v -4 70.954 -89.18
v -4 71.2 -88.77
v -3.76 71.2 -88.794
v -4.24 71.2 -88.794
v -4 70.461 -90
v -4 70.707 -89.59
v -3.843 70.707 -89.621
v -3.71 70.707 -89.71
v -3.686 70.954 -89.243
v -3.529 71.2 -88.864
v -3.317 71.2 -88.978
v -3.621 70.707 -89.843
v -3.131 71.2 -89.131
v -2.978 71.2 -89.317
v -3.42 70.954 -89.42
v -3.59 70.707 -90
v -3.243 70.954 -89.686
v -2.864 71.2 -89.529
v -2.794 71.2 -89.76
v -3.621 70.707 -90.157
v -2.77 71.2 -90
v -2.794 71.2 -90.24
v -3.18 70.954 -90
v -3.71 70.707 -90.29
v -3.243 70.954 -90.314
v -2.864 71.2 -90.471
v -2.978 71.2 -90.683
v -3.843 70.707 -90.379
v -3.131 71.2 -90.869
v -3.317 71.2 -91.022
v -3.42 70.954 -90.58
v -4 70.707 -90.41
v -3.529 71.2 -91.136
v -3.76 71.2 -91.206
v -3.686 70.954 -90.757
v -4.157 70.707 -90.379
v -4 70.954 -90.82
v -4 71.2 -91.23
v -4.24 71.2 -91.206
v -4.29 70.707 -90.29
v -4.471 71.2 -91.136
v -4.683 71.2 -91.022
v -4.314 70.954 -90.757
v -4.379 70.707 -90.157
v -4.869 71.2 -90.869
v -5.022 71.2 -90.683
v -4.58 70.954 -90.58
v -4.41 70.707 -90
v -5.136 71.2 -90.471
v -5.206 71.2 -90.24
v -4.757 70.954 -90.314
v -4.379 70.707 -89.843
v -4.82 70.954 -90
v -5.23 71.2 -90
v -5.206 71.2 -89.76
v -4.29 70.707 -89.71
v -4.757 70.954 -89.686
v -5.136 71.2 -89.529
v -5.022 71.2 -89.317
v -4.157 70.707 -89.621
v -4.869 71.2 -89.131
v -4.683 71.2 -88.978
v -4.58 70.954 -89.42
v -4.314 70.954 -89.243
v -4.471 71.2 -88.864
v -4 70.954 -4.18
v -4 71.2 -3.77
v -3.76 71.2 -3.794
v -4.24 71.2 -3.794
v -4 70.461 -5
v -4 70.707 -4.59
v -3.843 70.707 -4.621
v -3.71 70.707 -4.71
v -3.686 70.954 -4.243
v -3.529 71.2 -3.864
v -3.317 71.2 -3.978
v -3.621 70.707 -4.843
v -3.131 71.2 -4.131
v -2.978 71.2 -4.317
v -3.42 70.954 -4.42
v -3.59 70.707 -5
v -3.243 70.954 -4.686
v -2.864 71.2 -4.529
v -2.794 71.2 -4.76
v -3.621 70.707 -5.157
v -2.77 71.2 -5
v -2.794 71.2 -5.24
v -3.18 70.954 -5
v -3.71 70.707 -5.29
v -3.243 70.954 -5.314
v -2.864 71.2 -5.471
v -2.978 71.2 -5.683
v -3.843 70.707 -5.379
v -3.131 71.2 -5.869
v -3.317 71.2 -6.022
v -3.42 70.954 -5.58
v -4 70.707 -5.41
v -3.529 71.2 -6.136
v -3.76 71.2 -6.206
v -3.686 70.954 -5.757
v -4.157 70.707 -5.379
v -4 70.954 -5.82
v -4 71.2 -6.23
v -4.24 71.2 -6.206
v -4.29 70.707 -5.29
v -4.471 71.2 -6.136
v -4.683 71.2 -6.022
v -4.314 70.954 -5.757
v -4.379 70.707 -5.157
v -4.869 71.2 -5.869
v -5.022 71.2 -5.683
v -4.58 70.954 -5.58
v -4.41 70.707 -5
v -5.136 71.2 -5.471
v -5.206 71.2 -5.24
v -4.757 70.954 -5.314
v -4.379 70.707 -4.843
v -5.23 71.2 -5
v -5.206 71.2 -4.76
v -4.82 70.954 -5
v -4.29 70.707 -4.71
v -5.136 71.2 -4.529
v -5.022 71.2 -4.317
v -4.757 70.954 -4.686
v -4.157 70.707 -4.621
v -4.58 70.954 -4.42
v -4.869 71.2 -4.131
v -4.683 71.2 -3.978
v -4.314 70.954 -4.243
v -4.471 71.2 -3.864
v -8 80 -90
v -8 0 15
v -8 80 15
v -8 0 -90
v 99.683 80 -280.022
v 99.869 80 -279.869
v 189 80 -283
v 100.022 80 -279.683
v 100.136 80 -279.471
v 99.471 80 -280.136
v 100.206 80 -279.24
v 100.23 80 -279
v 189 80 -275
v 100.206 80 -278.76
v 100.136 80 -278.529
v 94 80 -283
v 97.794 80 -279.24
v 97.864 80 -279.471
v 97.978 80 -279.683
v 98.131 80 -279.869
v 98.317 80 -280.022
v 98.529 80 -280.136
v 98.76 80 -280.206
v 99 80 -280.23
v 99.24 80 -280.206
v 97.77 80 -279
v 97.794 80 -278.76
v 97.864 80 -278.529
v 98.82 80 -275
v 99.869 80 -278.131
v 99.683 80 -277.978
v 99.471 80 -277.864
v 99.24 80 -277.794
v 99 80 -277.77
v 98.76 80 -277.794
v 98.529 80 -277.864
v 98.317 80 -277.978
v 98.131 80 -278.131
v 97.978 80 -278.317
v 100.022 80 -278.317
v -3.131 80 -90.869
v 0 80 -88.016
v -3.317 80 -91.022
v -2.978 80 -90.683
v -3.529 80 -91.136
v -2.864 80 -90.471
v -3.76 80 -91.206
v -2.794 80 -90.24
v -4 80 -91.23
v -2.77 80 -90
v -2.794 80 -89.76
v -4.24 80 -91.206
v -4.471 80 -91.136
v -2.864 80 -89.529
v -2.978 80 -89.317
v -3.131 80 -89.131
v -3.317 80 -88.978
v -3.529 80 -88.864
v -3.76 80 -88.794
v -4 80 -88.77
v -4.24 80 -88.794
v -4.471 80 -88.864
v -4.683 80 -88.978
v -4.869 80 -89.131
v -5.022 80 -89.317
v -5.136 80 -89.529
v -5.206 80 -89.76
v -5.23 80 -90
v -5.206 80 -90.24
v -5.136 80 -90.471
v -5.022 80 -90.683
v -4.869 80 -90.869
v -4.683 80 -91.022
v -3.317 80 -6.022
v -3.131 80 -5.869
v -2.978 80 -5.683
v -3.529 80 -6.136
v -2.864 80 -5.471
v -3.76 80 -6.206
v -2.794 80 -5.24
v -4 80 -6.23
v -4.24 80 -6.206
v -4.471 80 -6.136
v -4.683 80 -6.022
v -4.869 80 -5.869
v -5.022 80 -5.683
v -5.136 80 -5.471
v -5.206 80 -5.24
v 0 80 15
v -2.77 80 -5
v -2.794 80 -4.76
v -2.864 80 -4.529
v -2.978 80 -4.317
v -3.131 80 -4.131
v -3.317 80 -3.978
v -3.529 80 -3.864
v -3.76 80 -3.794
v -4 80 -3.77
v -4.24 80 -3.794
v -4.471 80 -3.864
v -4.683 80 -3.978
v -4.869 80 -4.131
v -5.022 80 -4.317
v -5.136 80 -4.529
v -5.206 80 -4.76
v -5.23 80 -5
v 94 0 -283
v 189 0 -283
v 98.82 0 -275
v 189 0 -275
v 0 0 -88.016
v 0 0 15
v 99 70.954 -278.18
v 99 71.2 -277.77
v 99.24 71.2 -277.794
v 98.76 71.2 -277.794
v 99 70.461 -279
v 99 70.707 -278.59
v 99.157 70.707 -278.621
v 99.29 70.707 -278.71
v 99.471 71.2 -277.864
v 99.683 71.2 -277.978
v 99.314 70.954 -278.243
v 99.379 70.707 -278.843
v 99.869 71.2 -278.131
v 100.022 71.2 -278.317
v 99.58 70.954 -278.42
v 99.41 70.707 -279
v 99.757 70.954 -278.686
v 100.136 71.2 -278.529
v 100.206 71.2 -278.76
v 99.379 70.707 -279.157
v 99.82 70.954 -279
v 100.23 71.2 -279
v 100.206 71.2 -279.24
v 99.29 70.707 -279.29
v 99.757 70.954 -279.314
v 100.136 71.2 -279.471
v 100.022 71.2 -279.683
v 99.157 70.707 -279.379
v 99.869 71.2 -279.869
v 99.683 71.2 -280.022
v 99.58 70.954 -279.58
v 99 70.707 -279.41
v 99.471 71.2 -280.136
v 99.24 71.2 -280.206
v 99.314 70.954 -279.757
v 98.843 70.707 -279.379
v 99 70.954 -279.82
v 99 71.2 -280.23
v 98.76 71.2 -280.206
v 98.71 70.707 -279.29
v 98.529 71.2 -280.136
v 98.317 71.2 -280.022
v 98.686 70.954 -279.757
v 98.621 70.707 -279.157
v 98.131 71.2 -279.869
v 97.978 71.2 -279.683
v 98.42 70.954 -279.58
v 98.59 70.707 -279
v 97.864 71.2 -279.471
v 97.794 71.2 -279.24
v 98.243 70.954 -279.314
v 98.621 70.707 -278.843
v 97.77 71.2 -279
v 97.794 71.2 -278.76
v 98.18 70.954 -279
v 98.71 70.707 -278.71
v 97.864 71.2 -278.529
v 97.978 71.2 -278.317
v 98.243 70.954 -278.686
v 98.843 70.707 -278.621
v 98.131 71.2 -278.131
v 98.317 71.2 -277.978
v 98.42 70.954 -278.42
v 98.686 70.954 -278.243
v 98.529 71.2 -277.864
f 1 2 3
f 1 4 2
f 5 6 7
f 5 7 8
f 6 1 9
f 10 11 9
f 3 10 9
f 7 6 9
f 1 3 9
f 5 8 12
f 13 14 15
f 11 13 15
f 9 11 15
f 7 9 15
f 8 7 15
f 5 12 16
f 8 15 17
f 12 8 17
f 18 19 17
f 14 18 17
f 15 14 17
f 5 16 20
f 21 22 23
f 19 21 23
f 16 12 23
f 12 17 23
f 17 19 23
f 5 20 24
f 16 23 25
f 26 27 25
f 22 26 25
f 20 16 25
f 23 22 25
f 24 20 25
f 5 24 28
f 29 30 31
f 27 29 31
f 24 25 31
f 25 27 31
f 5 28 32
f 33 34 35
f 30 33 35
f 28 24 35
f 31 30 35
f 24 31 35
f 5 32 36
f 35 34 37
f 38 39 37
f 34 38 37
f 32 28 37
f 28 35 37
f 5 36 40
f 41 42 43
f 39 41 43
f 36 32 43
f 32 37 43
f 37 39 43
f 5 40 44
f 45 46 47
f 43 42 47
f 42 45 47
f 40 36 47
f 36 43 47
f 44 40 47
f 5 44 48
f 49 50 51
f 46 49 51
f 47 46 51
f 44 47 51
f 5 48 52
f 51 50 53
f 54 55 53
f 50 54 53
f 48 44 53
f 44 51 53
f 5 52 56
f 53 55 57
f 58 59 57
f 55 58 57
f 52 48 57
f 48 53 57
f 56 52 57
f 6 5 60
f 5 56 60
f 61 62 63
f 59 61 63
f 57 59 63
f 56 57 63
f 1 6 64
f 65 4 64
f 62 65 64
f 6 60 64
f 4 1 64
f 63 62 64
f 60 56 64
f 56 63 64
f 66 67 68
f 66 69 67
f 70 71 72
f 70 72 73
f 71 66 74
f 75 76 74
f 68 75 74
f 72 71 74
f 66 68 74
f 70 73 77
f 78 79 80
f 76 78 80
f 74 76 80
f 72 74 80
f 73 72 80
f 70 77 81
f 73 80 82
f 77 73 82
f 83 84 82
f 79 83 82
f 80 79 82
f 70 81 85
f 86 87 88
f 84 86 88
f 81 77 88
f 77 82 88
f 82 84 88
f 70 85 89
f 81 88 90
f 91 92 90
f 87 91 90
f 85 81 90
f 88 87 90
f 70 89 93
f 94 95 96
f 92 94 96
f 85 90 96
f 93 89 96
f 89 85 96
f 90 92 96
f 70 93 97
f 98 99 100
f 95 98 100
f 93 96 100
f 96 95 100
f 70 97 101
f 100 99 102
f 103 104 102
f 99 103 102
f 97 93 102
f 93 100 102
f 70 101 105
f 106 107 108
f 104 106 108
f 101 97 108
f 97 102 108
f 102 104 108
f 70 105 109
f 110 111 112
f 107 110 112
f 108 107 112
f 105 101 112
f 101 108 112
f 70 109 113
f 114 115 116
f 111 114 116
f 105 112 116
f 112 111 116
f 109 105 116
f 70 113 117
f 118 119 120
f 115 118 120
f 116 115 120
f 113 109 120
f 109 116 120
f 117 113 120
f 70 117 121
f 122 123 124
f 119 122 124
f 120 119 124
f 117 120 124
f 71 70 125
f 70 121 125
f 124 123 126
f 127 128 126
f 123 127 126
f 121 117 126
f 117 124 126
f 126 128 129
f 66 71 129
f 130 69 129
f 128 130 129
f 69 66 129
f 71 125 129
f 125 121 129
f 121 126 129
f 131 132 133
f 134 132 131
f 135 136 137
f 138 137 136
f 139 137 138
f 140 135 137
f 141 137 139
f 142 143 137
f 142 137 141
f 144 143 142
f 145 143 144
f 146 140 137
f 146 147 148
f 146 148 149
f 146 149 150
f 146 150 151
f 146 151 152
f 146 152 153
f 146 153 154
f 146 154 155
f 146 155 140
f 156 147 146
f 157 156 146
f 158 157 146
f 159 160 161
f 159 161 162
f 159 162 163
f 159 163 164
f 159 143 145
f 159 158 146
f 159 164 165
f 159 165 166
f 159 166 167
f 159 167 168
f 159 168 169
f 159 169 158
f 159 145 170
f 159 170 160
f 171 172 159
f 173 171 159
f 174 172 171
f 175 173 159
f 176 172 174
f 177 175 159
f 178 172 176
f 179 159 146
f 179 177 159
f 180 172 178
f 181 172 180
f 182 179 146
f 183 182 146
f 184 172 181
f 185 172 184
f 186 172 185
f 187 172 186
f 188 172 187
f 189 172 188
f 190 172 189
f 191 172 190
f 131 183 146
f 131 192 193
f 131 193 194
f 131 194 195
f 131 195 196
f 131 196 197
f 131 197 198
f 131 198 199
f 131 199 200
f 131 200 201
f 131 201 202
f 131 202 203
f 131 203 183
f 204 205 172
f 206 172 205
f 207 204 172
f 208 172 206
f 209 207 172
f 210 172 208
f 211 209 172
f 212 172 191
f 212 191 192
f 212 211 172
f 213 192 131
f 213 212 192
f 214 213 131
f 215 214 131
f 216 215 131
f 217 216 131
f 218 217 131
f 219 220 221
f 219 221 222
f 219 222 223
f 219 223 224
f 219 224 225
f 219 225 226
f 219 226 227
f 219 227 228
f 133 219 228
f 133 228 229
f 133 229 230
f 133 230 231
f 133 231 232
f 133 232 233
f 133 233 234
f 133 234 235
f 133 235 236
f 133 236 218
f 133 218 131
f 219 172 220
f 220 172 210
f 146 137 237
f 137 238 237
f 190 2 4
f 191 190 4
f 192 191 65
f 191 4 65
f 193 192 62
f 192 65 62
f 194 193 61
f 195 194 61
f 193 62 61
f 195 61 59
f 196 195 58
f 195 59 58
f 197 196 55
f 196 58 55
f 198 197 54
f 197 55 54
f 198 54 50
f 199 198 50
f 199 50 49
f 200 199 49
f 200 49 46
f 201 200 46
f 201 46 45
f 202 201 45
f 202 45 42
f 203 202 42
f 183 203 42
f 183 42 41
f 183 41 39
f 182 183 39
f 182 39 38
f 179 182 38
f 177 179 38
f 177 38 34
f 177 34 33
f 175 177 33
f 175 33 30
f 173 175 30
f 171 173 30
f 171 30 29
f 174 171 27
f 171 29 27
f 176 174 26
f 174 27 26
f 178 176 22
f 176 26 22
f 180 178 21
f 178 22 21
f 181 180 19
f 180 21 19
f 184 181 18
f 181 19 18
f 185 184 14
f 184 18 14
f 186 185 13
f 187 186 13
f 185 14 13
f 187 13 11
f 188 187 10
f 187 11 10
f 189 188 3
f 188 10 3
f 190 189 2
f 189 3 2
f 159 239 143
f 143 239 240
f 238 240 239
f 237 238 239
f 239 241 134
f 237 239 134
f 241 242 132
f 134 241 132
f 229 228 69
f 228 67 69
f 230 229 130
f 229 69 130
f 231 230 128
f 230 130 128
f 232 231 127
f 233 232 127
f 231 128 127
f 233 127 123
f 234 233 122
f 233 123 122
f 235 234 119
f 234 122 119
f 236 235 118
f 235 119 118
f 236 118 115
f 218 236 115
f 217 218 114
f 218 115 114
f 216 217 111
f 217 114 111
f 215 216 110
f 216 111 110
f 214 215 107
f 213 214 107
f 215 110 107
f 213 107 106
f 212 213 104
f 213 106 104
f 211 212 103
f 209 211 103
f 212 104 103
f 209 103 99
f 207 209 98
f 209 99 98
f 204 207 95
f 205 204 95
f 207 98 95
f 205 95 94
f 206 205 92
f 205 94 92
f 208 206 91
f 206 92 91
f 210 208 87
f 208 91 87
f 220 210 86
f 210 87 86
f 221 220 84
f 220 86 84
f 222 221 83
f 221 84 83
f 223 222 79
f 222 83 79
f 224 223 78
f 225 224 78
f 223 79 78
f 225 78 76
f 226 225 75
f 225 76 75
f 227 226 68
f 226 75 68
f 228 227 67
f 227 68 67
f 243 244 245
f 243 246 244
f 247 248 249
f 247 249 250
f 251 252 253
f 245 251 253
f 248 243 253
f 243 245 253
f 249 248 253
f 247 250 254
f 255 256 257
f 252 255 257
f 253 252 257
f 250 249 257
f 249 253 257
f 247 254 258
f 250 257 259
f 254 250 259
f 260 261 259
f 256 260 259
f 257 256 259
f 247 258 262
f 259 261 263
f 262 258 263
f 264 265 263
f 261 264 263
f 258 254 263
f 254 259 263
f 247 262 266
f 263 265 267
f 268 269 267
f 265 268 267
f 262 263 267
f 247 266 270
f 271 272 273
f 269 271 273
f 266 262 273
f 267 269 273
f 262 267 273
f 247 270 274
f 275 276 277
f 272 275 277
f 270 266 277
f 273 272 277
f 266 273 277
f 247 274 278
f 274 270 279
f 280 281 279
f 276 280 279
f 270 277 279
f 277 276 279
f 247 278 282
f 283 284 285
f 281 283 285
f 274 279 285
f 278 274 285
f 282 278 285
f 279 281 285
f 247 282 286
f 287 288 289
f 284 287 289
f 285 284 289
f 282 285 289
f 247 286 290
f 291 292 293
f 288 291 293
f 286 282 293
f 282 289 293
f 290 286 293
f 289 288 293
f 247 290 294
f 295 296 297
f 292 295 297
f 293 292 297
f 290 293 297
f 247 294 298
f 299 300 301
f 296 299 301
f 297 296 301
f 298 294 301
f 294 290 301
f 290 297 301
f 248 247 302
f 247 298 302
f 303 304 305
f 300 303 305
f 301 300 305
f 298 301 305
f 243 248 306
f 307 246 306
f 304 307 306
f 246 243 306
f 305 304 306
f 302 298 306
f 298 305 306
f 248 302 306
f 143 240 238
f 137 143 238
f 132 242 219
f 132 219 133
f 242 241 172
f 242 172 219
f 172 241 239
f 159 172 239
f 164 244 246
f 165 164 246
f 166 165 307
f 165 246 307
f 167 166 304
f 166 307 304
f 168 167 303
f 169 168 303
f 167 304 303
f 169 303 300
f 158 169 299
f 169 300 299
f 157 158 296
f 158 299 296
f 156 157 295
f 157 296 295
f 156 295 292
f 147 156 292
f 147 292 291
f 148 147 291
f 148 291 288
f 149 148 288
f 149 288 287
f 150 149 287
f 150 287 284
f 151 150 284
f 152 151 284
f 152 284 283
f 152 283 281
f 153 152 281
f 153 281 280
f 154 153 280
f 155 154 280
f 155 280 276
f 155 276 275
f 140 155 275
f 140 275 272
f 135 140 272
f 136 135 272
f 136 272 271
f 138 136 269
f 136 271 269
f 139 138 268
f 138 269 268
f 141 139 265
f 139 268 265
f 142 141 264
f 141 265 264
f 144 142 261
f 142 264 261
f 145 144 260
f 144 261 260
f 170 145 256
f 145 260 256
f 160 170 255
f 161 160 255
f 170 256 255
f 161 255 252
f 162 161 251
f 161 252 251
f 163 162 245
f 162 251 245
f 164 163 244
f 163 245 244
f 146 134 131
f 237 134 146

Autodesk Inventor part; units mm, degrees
ref_plane "YZ Plane" through (0, 0, 0) normal (1, 0, 0) x (0, 1, 0)
ref_plane "XZ Plane" through (0, 0, 0) normal (0, 1, 0) x (-1, 0, 0)
ref_plane "XY Plane" through (0, 0, 0) normal (0, 0, 1) x (1, 0, 0)
sketch "スケッチ1" plane through (0, 0, 0) normal (0, 1, 0) x (-1, 0, 0)
  line L0 (0, 0) -> (8, 0)
  line L1 (8, 0) -> (8, -90)
  line L2 (8, -90) -> (0, -90)
  line L3 (0, -90) -> (0, 0)
  line L4 (-94, -275) -> (-189, -275)
  line L5 (-189, -275) -> (-189, -283)
  line L6 (-189, -283) -> (-94, -283)
  line L7 (-94, -283) -> (-94, -275)
  line L8 (8, -90) -> (-94, -283)
  line L9 (0, -88.016) -> (-98.8205, -275)
  line L10 (8, 0) -> (0, 0)
  line L11 (0, 0) -> (0, 15)
  line L12 (0, 15) -> (8, 15)
  line L13 (8, 15) -> (8, 0)
  dimension "d0" = 8
  dimension "d1" = 90
  dimension "d4" = 8
  dimension "d5" = 185
  dimension "d6" = 94
  dimension "d7" = 8
  dimension "d20" = 95
  dimension "d21" = 15
extrude "押し出し1" add sketch "スケッチ1" along normal blind 80
sketch "スケッチ2" plane through (0, 80, 0) normal (0, 1, 0) x (1, 0, 0)
  line L0 (0, -15) -> (0, 88.016) projected
  point P0 (-4, 5)
  point P1 (-4, 90)
  point P2 (99, 279)
  point P3 (-4, 0)
  dimension "d8" = 5
  dimension "d9" = 85
  dimension "d11" = 189
  dimension "d12" = 103
  dimension "d22" = 4
hole "穴1" at (-4, 80, -5) at (-4, 80, -90) at (99, 80, -279) direction (0, -1, 0) diameter 2.459 depth 8.8 tip angle 118 thread size "M3x0.5" class "6H" standard "ISO Metric profile"
properties part number "右仕切り"
